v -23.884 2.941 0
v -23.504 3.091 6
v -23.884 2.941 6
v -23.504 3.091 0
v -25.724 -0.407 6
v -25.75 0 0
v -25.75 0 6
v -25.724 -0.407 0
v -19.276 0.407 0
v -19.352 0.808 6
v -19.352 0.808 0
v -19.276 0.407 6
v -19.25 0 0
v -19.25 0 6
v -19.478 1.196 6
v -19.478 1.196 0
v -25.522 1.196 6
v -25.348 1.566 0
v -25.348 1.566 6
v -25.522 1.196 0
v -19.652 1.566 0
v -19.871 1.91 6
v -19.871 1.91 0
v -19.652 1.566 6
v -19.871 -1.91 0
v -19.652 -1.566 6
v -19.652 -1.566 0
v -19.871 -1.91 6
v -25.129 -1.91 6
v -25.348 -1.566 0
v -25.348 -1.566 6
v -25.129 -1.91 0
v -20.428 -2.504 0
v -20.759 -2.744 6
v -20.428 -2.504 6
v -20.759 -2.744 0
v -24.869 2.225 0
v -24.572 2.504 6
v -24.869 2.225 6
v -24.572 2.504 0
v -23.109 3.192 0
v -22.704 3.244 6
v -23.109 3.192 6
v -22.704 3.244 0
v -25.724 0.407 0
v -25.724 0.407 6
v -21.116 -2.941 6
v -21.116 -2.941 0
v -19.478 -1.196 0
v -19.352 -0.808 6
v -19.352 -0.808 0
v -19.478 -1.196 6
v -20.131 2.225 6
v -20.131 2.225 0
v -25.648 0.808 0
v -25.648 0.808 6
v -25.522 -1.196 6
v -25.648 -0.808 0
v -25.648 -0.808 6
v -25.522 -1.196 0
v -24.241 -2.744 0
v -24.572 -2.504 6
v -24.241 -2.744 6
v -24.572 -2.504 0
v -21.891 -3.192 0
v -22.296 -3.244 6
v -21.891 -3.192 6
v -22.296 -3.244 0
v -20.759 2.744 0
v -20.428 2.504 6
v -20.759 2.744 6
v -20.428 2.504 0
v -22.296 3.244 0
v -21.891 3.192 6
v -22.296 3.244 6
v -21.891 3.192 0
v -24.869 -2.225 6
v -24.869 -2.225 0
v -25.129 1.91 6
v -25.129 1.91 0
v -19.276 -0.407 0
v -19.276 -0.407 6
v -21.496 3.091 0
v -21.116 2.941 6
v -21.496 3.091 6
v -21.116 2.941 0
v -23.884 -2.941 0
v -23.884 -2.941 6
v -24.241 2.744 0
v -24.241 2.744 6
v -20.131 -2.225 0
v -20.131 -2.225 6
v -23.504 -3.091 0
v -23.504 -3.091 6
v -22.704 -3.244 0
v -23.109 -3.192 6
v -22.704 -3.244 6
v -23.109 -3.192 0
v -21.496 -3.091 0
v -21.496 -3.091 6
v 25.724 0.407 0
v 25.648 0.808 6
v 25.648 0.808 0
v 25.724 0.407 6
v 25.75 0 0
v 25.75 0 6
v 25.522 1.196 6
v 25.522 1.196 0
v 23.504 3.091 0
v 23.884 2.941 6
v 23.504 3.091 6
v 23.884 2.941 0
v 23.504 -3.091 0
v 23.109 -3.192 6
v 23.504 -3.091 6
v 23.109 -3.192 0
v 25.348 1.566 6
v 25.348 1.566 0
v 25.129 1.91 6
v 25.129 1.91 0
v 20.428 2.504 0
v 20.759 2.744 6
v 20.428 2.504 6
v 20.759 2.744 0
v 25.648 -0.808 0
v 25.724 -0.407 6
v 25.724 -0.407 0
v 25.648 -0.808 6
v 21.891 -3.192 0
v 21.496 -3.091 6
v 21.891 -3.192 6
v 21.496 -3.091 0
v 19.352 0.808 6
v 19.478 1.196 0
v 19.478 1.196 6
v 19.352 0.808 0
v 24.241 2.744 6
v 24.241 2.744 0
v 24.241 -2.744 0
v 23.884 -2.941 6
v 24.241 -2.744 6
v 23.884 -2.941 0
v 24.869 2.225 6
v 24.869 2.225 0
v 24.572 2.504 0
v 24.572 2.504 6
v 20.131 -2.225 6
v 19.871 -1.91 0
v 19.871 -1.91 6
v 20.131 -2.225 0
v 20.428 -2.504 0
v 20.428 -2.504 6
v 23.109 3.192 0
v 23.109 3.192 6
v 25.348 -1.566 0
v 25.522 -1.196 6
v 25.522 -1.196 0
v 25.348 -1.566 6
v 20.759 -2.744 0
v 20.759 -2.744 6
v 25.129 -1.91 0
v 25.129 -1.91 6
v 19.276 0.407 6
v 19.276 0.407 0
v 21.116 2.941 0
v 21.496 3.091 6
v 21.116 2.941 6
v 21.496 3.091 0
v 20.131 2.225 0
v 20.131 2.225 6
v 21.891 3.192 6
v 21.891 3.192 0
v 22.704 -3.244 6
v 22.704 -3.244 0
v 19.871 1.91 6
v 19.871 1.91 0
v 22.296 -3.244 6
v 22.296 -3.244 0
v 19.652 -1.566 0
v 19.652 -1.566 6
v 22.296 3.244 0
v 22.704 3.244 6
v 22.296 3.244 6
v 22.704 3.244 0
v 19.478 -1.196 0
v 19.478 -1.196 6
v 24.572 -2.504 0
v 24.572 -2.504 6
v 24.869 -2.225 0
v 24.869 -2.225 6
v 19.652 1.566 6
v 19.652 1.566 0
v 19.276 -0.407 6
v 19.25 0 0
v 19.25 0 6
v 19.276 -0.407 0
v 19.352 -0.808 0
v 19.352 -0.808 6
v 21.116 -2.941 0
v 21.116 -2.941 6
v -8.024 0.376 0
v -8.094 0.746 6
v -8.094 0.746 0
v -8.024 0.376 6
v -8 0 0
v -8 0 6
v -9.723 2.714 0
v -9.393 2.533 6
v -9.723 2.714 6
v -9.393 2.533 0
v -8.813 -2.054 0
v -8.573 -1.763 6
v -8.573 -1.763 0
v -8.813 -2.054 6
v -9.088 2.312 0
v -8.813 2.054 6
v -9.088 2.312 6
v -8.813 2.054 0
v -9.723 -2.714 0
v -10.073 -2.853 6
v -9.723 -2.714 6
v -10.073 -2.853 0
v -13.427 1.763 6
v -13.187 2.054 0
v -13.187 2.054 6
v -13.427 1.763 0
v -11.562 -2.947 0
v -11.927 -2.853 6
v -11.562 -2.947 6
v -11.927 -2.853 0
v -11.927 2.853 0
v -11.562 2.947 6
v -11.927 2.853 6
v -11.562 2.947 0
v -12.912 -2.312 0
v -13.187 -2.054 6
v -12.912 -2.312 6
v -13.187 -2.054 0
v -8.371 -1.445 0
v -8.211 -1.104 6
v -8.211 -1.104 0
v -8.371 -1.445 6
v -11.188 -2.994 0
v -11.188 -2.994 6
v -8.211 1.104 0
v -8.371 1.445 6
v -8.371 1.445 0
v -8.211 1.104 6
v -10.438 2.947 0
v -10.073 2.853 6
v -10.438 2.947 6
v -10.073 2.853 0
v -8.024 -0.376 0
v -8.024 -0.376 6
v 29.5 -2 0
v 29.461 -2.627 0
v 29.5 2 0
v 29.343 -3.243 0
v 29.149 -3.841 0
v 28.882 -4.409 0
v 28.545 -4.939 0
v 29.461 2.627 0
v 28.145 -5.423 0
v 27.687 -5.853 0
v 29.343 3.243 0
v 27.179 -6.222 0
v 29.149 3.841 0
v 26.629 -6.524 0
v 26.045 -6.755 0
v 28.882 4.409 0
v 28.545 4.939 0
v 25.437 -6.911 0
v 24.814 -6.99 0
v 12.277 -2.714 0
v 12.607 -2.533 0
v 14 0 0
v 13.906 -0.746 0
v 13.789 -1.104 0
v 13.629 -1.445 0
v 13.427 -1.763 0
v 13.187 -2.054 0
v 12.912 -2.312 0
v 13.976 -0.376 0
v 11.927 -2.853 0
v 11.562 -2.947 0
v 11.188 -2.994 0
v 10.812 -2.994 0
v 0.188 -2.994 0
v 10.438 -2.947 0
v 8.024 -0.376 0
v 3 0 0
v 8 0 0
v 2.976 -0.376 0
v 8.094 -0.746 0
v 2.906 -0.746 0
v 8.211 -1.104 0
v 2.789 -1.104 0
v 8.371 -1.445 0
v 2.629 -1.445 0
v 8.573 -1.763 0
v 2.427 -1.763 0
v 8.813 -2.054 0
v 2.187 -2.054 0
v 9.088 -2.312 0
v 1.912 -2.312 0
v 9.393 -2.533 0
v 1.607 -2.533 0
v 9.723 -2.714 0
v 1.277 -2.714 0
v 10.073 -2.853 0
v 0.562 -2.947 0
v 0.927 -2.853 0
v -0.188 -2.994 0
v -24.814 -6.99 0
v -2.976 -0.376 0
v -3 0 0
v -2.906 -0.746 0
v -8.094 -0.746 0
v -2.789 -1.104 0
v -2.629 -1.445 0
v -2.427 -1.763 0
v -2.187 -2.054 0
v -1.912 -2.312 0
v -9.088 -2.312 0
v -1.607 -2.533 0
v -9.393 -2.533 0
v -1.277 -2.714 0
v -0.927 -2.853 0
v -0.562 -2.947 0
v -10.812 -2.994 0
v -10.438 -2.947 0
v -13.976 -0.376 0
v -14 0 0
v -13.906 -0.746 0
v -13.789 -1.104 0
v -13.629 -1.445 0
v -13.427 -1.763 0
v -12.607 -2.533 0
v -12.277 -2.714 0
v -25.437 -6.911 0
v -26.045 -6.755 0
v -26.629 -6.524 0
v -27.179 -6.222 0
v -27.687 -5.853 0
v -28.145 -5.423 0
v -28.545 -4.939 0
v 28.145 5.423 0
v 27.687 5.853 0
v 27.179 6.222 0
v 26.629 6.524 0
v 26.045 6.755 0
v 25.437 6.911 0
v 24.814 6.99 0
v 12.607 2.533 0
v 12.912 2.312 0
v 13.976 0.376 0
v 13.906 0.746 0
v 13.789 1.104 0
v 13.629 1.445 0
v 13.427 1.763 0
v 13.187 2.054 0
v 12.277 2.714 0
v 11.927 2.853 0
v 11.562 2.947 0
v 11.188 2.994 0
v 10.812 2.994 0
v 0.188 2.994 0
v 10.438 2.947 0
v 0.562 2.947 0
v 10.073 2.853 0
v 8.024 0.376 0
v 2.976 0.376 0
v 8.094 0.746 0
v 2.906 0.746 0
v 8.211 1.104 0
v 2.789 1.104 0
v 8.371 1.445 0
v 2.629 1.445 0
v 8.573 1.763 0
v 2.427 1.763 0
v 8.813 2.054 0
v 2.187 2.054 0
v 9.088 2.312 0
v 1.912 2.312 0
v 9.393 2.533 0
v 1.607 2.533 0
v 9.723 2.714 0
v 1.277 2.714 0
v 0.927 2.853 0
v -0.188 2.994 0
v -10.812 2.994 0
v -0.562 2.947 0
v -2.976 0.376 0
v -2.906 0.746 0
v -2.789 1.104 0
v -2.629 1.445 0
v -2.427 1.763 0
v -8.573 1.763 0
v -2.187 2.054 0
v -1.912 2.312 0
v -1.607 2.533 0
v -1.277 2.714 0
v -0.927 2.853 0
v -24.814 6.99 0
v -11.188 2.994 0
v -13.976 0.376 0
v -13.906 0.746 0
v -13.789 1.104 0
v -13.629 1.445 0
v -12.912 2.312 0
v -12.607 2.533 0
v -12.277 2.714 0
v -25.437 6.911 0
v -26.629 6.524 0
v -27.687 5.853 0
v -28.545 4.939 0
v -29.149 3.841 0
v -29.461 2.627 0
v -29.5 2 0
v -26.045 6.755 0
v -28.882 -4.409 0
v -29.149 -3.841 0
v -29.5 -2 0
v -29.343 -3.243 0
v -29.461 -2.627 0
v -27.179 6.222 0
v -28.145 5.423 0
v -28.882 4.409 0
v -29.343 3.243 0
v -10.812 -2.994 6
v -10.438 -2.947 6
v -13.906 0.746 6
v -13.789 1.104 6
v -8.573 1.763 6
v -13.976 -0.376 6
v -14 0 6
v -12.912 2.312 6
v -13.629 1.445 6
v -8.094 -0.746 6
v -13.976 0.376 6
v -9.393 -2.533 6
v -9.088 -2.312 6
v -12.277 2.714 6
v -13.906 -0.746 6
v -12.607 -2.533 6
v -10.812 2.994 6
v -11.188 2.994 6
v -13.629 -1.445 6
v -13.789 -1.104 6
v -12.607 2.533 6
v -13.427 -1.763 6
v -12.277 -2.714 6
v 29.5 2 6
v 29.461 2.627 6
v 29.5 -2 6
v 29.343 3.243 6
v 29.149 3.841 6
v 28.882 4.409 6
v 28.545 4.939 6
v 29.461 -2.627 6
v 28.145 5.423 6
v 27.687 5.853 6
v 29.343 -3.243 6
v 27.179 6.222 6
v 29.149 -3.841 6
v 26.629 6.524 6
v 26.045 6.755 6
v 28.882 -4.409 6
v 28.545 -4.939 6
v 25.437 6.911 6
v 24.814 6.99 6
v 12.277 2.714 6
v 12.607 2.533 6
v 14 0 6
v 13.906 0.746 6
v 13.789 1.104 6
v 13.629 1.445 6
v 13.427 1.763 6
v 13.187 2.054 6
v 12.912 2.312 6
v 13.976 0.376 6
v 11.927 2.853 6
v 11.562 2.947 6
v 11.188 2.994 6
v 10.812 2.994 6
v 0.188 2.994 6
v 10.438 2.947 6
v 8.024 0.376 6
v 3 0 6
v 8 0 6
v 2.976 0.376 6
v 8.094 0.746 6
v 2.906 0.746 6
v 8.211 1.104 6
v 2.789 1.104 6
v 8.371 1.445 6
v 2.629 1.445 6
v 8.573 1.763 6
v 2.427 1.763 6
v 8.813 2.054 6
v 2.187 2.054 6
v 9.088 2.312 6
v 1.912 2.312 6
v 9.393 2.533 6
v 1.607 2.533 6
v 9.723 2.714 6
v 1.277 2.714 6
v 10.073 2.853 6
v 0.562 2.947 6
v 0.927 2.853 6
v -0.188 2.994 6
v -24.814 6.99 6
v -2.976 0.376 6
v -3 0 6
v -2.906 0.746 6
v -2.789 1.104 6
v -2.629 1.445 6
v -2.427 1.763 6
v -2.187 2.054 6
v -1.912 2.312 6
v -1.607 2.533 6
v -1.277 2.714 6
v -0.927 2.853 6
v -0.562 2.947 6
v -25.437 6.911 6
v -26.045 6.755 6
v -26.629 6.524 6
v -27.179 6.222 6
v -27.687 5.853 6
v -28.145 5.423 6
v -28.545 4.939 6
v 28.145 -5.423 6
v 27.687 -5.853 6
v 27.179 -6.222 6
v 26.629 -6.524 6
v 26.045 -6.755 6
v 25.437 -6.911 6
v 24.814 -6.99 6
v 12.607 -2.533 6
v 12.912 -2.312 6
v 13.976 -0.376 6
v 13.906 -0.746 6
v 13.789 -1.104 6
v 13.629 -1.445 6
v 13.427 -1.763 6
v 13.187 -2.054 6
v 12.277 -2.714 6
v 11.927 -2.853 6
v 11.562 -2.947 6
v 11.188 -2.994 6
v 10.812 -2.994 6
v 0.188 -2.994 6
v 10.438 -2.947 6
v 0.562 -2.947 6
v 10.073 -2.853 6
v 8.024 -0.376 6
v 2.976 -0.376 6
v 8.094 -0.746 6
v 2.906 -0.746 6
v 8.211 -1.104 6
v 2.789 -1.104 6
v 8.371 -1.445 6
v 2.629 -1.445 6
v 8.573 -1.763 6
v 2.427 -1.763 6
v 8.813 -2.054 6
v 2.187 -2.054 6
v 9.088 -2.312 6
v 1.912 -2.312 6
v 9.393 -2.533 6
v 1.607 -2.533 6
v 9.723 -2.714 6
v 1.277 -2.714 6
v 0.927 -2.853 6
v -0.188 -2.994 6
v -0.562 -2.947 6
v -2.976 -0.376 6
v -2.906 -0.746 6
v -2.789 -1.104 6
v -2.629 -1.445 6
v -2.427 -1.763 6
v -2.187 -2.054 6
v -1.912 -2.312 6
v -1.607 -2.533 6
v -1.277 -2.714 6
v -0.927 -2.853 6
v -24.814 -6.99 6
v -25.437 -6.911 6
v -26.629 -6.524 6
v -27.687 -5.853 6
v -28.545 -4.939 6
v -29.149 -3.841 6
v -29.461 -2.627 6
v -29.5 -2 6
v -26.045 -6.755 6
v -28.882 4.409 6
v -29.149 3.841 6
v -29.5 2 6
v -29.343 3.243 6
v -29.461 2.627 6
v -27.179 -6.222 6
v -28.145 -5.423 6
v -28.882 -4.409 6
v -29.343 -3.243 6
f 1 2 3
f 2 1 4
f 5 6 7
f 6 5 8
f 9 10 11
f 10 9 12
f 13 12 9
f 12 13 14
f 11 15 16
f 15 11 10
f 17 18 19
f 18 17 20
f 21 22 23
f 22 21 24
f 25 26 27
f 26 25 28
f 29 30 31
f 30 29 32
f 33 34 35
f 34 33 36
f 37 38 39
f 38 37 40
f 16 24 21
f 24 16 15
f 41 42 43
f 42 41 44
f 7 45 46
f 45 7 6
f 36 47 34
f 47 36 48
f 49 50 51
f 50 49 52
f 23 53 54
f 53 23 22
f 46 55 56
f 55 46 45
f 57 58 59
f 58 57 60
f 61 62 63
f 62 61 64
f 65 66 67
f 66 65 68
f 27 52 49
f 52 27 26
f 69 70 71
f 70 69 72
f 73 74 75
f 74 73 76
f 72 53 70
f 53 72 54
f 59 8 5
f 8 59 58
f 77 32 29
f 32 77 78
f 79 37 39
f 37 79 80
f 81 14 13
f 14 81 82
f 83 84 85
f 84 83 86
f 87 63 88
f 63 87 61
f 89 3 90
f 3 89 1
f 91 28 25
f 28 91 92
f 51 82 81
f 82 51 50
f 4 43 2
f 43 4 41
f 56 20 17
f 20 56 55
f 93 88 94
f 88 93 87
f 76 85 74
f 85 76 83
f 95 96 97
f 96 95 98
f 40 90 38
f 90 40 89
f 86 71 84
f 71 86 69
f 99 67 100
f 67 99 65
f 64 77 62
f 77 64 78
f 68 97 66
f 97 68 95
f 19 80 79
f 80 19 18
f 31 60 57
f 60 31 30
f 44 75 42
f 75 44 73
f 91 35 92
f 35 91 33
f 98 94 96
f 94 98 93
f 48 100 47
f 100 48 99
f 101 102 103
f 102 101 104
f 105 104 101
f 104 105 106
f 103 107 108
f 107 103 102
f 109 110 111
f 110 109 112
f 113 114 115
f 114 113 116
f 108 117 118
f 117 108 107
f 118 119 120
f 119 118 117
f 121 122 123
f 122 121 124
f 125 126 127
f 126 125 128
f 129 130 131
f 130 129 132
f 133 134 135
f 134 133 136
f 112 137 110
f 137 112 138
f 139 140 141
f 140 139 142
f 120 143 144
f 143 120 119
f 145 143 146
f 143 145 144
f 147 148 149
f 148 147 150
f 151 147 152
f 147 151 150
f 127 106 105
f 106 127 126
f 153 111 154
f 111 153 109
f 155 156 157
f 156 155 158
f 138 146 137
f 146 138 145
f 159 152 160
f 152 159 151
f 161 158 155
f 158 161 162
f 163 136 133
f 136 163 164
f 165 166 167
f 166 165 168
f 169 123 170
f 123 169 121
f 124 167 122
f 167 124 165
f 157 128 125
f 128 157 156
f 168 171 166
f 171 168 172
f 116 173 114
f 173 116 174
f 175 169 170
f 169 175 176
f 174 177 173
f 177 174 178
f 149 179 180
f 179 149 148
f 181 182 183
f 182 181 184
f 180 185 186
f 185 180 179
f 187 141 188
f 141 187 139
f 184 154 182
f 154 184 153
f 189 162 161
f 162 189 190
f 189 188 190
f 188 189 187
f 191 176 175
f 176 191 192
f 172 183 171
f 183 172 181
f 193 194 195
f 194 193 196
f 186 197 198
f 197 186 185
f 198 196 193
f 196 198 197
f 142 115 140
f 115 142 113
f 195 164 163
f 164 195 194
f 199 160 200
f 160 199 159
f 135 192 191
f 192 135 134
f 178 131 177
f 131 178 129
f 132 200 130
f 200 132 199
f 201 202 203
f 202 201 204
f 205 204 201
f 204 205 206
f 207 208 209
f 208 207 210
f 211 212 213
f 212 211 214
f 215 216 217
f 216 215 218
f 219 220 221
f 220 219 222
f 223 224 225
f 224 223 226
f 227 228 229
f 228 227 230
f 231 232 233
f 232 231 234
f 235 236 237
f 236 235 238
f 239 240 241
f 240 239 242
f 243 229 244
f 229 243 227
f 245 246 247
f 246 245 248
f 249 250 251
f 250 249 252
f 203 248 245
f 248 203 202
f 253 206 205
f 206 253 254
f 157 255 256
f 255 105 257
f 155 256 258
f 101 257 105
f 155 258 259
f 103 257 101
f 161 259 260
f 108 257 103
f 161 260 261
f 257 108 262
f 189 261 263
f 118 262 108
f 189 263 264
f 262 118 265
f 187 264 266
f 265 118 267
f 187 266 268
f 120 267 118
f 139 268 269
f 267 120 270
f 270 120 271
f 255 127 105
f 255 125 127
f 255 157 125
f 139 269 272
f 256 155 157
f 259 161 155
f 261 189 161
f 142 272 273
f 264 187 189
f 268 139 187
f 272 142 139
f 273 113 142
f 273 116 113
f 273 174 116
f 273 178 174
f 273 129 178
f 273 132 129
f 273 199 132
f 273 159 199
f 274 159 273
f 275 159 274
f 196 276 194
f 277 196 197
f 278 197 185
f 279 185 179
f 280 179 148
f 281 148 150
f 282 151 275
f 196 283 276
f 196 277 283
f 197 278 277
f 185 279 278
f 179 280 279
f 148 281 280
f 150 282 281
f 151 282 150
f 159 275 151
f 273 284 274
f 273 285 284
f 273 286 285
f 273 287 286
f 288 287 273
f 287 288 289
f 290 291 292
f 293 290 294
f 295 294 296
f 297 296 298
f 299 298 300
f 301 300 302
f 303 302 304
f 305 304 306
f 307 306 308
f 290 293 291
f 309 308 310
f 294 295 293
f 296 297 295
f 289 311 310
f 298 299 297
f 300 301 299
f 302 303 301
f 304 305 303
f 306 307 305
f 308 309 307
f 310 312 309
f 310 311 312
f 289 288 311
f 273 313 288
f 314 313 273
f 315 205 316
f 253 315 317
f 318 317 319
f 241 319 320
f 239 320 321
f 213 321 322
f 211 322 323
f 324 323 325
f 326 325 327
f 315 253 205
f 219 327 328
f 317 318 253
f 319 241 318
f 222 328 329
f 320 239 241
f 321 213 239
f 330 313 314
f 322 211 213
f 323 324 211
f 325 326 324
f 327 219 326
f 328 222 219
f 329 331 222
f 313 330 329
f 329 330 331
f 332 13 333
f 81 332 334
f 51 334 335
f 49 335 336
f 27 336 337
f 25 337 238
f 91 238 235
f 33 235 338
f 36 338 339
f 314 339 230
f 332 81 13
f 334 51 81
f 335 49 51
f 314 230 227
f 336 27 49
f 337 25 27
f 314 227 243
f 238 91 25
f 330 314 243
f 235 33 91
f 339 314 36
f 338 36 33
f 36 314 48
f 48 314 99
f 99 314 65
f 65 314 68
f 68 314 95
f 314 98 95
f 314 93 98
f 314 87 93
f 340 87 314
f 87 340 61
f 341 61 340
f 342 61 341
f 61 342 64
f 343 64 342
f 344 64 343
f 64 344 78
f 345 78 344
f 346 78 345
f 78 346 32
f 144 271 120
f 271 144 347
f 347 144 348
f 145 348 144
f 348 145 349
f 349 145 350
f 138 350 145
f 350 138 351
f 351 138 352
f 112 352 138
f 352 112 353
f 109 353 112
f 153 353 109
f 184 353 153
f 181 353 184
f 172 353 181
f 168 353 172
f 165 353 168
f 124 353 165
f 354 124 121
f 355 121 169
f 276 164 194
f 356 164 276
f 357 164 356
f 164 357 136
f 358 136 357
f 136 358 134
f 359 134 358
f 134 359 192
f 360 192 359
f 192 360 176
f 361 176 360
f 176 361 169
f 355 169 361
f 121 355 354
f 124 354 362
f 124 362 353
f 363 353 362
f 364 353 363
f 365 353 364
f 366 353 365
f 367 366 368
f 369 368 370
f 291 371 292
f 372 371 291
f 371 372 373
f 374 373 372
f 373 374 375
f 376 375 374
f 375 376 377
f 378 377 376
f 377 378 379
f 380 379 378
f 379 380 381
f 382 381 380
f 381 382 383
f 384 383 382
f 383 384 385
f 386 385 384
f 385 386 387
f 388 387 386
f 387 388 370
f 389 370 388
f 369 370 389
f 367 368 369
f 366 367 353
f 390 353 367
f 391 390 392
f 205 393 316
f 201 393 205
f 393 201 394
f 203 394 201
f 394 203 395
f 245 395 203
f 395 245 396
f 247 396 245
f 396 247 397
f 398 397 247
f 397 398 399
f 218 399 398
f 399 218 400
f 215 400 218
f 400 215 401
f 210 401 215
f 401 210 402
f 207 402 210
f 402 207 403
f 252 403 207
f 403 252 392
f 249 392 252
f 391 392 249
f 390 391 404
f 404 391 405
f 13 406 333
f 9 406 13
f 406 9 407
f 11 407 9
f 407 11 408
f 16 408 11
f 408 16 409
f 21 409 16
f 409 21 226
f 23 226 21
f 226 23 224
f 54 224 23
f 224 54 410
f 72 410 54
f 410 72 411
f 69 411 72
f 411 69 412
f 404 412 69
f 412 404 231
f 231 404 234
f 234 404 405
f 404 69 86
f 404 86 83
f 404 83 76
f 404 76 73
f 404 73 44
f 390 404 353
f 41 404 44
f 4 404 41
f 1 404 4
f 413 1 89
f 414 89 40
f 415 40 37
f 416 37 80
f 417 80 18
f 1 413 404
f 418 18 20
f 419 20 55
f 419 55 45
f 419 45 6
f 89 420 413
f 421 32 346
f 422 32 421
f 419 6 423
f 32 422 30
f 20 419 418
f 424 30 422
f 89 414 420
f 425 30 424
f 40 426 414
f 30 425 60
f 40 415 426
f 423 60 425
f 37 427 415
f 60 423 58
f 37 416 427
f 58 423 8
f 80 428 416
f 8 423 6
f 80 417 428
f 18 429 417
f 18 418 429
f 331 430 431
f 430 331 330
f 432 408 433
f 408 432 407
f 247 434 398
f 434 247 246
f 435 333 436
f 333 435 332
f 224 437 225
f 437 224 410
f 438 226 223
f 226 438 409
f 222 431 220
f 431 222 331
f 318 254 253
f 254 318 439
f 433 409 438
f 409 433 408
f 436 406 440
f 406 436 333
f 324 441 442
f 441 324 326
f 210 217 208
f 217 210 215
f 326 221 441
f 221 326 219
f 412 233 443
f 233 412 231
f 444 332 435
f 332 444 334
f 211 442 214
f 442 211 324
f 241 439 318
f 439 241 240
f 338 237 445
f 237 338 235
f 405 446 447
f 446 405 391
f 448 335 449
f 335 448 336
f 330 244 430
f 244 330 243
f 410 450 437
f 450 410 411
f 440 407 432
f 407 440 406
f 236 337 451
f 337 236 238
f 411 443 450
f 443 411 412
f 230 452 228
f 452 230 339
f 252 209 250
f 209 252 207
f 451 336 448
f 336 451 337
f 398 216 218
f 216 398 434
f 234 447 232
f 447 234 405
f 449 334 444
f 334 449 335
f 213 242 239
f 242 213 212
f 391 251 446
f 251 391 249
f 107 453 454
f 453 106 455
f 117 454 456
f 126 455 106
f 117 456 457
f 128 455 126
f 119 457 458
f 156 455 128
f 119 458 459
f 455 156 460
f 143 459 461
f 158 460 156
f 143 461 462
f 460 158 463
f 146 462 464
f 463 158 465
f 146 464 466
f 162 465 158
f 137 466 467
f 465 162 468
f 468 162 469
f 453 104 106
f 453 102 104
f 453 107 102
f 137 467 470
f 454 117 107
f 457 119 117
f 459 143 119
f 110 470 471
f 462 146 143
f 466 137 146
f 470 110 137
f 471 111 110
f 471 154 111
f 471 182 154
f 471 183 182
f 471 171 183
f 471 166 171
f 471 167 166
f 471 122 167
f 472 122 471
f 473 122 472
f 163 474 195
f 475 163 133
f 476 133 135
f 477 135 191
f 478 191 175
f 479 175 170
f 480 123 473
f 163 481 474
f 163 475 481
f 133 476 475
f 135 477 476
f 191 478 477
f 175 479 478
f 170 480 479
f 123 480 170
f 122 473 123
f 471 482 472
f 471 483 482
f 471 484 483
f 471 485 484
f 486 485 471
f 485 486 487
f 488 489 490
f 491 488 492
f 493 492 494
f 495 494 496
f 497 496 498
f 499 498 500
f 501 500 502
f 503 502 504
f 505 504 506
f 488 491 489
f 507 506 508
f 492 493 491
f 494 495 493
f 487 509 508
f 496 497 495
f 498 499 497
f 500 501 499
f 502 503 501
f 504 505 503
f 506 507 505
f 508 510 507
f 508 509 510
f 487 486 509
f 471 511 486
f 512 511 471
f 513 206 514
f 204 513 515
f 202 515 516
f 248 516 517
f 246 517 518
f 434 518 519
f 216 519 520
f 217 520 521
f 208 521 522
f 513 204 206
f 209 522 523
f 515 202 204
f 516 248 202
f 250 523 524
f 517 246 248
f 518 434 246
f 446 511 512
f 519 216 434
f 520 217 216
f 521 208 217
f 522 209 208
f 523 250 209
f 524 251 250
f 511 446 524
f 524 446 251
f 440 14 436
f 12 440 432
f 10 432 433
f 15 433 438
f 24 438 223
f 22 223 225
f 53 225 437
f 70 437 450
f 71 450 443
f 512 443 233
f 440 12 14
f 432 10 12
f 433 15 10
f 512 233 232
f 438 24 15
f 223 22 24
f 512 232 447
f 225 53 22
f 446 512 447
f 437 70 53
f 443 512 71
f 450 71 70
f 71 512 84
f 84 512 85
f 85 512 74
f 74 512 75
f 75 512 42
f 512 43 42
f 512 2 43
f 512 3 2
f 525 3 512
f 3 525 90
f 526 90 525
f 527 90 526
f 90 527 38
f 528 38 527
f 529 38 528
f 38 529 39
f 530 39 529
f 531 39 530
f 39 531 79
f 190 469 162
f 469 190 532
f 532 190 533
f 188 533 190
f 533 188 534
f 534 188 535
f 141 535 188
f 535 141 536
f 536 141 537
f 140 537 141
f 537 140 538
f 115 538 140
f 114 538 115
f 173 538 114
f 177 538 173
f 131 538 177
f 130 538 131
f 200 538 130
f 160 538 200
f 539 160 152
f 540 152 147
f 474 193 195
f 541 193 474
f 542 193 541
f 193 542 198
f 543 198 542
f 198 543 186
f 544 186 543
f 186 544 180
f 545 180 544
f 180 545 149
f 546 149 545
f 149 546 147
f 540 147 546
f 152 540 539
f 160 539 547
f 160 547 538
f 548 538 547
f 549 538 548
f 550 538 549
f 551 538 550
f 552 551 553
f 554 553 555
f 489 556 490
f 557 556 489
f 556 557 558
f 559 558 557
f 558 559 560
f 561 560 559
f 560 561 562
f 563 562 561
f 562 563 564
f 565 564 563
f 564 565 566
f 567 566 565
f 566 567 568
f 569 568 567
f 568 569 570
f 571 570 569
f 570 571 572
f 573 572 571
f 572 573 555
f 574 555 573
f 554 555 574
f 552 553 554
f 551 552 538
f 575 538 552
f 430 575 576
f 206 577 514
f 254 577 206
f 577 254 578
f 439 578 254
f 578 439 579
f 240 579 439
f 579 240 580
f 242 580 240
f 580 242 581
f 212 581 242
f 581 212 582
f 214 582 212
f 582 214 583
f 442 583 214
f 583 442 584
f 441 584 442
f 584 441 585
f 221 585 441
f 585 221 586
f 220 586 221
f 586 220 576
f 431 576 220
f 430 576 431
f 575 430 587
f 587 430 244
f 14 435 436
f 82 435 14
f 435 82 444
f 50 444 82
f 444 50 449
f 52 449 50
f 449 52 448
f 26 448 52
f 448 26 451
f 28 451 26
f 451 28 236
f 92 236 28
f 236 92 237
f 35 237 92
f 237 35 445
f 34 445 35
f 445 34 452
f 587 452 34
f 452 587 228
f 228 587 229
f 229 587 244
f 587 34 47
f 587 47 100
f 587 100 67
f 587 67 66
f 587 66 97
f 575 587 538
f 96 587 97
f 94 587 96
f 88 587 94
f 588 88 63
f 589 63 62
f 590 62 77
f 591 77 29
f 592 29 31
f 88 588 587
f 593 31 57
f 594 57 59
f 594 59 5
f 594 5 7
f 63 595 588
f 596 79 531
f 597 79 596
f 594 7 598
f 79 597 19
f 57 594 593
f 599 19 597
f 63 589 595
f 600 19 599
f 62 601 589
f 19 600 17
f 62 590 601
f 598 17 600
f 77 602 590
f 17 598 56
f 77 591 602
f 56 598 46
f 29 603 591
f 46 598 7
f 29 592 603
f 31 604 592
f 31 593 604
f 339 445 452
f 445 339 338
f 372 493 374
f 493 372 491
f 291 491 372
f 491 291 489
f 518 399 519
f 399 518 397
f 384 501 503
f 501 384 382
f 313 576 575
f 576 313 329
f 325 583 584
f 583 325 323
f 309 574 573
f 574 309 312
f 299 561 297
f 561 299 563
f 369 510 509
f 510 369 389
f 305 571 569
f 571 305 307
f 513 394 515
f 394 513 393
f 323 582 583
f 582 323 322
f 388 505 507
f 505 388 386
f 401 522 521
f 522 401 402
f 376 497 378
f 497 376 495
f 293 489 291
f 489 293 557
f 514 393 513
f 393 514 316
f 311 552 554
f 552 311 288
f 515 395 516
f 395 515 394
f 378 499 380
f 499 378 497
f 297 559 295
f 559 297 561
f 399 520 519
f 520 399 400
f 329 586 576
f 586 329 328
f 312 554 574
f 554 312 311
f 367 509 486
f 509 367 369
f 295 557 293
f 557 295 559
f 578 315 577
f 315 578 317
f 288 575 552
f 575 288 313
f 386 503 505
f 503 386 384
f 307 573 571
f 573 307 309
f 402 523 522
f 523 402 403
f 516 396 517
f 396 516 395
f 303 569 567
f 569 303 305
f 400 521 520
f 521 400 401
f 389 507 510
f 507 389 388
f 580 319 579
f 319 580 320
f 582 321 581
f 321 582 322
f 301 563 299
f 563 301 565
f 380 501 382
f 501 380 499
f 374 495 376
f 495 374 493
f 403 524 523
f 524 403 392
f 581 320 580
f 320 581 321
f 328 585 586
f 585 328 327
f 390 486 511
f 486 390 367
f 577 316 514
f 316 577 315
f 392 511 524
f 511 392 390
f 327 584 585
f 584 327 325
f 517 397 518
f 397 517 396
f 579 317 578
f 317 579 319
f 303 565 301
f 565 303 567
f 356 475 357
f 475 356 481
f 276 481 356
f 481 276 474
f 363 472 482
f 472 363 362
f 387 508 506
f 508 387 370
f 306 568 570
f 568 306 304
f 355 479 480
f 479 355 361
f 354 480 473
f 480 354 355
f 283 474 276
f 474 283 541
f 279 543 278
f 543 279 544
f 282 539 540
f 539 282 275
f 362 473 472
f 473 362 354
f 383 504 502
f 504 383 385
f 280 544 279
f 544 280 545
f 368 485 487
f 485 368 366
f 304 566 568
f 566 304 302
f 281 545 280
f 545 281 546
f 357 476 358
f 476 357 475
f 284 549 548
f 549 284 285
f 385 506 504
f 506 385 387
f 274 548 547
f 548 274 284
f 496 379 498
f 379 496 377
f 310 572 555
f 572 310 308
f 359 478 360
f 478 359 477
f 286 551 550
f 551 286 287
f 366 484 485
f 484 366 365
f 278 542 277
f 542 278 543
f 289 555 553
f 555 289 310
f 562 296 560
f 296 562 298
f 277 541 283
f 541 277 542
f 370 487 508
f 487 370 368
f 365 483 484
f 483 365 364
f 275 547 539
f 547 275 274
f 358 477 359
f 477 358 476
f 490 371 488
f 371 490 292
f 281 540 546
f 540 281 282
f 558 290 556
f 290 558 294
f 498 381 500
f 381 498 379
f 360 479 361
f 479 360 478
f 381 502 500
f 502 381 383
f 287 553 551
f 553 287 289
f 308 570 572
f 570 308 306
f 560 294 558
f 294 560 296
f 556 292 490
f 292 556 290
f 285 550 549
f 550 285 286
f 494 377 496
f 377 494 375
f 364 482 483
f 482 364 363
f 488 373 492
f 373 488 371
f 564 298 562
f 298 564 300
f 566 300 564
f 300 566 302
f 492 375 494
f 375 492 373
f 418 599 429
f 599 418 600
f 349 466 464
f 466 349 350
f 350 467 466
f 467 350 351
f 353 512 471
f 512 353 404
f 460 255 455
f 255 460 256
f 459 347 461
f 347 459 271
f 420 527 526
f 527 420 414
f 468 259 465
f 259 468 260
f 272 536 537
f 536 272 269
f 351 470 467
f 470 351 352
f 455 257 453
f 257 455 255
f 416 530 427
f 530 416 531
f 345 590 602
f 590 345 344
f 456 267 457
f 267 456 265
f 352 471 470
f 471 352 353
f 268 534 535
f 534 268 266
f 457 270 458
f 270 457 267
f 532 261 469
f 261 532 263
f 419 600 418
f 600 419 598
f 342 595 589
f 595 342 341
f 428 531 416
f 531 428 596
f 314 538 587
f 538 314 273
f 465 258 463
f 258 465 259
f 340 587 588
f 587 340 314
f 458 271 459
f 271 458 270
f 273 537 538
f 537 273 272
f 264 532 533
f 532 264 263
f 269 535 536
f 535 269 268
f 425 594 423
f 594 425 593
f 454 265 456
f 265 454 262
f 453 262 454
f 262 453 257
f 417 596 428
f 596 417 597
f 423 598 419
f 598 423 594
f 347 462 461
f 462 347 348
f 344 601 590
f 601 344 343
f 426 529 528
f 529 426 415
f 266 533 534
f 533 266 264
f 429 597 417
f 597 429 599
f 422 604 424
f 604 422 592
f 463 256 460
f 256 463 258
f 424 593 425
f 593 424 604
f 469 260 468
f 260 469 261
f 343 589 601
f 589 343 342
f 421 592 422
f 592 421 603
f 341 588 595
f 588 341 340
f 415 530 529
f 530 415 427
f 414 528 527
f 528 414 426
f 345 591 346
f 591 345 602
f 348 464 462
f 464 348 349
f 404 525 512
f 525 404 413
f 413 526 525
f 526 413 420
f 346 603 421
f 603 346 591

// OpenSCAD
$fn = 50;


difference() {
	union() {
		hull() {
			translate(v = [-24.5000000000, 2.0000000000, 0]) {
				cylinder(h = 6, r = 5);
			}
			translate(v = [24.5000000000, 2.0000000000, 0]) {
				cylinder(h = 6, r = 5);
			}
			translate(v = [-24.5000000000, -2.0000000000, 0]) {
				cylinder(h = 6, r = 5);
			}
			translate(v = [24.5000000000, -2.0000000000, 0]) {
				cylinder(h = 6, r = 5);
			}
		}
	}
	union() {
		#translate(v = [-22.5000000000, 0.0000000000, 0]) {
			cylinder(h = 6, r = 3.2500000000);
		}
		#translate(v = [22.5000000000, 0.0000000000, 0]) {
			cylinder(h = 6, r = 3.2500000000);
		}
		#translate(v = [-22.5000000000, 0.0000000000, -100.0000000000]) {
			cylinder(h = 200, r = 3.2500000000);
		}
		#translate(v = [-22.5000000000, 0.0000000000, -100.0000000000]) {
			cylinder(h = 200, r = 3.2500000000);
		}
		#translate(v = [22.5000000000, 0.0000000000, -100.0000000000]) {
			cylinder(h = 200, r = 3.2500000000);
		}
		#translate(v = [22.5000000000, 0.0000000000, -100.0000000000]) {
			cylinder(h = 200, r = 3.2500000000);
		}
		#translate(v = [-22.5000000000, 0.0000000000, 0]) {
			cylinder(h = 6, r = 1.8000000000);
		}
		#translate(v = [22.5000000000, 0.0000000000, 0]) {
			cylinder(h = 6, r = 1.8000000000);
		}
		#translate(v = [-22.5000000000, 0.0000000000, 0]) {
			cylinder(h = 6, r = 1.8000000000);
		}
		#translate(v = [22.5000000000, 0.0000000000, 0]) {
			cylinder(h = 6, r = 1.8000000000);
		}
		#translate(v = [-22.5000000000, 0.0000000000, 0]) {
			cylinder(h = 6, r = 1.8000000000);
		}
		#translate(v = [22.5000000000, 0.0000000000, 0]) {
			cylinder(h = 6, r = 1.8000000000);
		}
		#translate(v = [-11.0000000000, 0, 0]) {
			cylinder(h = 6, r = 3.0000000000);
		}
		#cylinder(h = 6, r = 3.0000000000);
		#translate(v = [11.0000000000, 0, 0]) {
			cylinder(h = 6, r = 3.0000000000);
		}
	}
}
